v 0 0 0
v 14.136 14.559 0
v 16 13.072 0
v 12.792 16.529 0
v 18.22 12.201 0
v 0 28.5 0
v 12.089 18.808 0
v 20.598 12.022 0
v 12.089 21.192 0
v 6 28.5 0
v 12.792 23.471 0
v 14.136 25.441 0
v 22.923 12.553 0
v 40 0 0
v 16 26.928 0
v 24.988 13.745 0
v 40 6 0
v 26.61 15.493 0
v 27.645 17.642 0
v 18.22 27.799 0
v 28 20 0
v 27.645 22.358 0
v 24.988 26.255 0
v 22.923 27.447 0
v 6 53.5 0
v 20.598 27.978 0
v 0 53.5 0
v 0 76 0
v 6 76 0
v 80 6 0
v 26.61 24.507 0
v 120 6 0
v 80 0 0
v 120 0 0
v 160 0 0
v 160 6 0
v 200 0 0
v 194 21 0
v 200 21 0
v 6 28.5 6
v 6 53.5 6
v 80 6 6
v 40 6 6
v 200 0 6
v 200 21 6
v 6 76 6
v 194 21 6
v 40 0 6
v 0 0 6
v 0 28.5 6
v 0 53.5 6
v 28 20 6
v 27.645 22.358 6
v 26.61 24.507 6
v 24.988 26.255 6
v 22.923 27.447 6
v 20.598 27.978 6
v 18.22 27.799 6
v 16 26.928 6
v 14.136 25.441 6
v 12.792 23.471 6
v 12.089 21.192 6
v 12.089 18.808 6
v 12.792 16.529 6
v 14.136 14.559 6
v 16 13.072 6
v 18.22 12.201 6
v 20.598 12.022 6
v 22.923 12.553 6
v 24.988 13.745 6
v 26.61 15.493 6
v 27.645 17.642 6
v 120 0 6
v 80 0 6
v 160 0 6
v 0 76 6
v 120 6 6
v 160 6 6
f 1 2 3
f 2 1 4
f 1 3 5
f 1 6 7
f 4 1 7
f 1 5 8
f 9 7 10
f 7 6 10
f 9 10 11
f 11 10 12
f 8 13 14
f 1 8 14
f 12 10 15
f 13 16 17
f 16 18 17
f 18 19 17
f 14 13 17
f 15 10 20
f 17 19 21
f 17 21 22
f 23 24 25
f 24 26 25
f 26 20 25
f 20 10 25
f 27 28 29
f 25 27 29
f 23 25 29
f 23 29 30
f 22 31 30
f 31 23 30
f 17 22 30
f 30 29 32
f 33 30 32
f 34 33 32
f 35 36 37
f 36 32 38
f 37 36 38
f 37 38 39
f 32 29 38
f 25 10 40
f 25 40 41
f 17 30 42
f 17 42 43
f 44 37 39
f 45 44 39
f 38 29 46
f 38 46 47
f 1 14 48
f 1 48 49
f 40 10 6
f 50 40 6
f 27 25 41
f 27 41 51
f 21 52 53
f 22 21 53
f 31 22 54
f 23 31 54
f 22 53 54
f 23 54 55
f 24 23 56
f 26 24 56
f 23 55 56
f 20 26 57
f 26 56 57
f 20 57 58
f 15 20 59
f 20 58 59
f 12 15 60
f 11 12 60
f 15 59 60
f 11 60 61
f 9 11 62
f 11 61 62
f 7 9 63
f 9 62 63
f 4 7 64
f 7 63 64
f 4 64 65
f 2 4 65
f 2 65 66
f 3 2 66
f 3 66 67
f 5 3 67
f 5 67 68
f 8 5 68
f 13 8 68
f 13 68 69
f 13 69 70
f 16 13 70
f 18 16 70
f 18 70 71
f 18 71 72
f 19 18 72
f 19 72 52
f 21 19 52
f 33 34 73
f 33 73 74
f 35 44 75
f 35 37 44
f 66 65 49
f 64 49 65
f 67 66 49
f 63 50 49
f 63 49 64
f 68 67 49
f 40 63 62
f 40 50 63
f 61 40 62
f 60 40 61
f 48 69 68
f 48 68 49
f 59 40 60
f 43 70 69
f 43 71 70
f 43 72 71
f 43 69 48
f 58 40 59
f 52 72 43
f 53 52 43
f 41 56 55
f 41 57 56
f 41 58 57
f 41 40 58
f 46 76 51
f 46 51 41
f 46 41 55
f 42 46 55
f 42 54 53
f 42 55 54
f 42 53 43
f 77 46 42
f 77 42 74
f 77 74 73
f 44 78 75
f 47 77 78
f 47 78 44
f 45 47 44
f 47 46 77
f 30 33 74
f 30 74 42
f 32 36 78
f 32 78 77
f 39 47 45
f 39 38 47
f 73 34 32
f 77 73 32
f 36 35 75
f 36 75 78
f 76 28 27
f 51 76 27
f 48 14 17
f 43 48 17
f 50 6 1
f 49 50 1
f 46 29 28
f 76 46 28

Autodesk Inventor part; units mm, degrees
ref_plane "YZ Plane" through (0, 0, 0) normal (1, 0, 0) x (0, 1, 0)
ref_plane "XZ Plane" through (0, 0, 0) normal (0, 1, 0) x (-1, 0, 0)
ref_plane "XY Plane" through (0, 0, 0) normal (0, 0, 1) x (1, 0, 0)
ref_plane "Work Plane1" through (0, 0, 0) normal (0, 0, 1) x (1, 0, 0)
sketch "Sketch1" plane through (0, 0, 0) normal (0, 0, 1) x (1, 0, 0)
  line L0 (0, 6) -> (40, 6)
  line L1 (0, 0) -> (0, 6)
  line L2 (40, 0) -> (0, 0)
  line L3 (40, 0) -> (40, 6)
  line L4 (80, 0) -> (80, 6)
  line L5 (80, 6) -> (40, 6)
  line L6 (40, 6) -> (40, 0)
  line L7 (40, 0) -> (80, 0)
  line L8 (80, 6) -> (120, 6)
  line L9 (80, 0) -> (80, 6)
  line L10 (120, 0) -> (80, 0)
  line L11 (120, 0) -> (120, 6)
  line L12 (160, 0) -> (160, 6)
  line L13 (160, 6) -> (120, 6)
  line L14 (120, 6) -> (120, 0)
  line L15 (120, 0) -> (160, 0)
  line L16 (160, 6) -> (200, 6)
  line L17 (160, 0) -> (160, 6)
  line L18 (200, 0) -> (160, 0)
  line L19 (200, 6) -> (200, 0)
  line L20 (200, 6) -> (200, 21)
  line L21 (194, 21) -> (200, 21)
  line L22 (194, 21) -> (194, 6)
  line L23 (194, 6) -> (200, 6)
  line L24 (6, 28.5) -> (0, 28.5)
  line L25 (0, 28.5) -> (0, 6)
  line L26 (6, 6) -> (0, 6)
  line L27 (6, 6) -> (6, 28.5)
  line L28 (0, 53.5) -> (0, 28.5)
  line L29 (6, 28.5) -> (0, 28.5)
  line L30 (6, 28.5) -> (6, 53.5)
  line L31 (6, 53.5) -> (0, 53.5)
  line L32 (6, 53.5) -> (0, 53.5)
  line L33 (6, 53.5) -> (6, 76)
  line L34 (6, 76) -> (0, 76)
  line L35 (0, 76) -> (0, 53.5)
  line L36 (6, 76) -> (194, 21)
extrude "Plate1" add sketch "Sketch1" along normal blind 6 contours L25 L24 L27 L0 | L0 L3 L2 L1 | L27 L30 L33 L36 L22 L16 L13 L8 L5 L0 | L35 L34 L33 L31 | L8 L11 L10 L4 | L16 L19 L18 L12 | L21 L20 L16 L22
sketch "Sketch2" plane through (0, 0, 6) normal (0, 0, 1) x (1, 0, 0)
  line L0 (0, 0) -> (0, 28.5) projected
  line L1 (40, 0) -> (0, 0) projected
  line L2 (40, 6) -> (40, 0) projected
  line L3 (80, 6) -> (40, 6) projected
  line L4 (80, 0) -> (80, 6) projected
  line L5 (120, 0) -> (80, 0) projected
  line L6 (120, 6) -> (120, 0) projected
  line L7 (160, 6) -> (120, 6) projected
  line L8 (160, 0) -> (160, 6) projected
  line L9 (200, 0) -> (160, 0) projected
  line L10 (200, 21) -> (200, 0) projected
  line L11 (194, 21) -> (200, 21) projected
  line L12 (6, 76) -> (194, 21) projected
  line L13 (0, 76) -> (6, 76) projected
  line L14 (0, 53.5) -> (0, 76) projected
  line L15 (6, 53.5) -> (0, 53.5) projected
  line L16 (6, 28.5) -> (6, 53.5) projected
  line L17 (0, 28.5) -> (6, 28.5) projected
  circle A0 centre (20, 20) radius 8
  point P0 (0, 0)
  point P1 (20, 0)
  dimension "d1" = 16
  dimension "d2" = 20
extrude "Cut1" cut sketch "Sketch2" against normal blind 6 contours A0
equation "\"d3\" = Thickness"
equation "\"d0\" = Thickness"
equation "\"BendRadius\" = Thickness"
equation "\"BendReliefWidth\" = Thickness"
equation "\"BendReliefDepth\" = 0.5 * Thickness"
equation "\"CornerReliefSize\" = 4 * Thickness"
equation "\"MinimumRemnant\" = 2 * Thickness"
equation "\"TransitionRadius\" = BendRadius"
equation "\"JacobiRadiusSize\" = BendRadius"
equation "\"GapSize\" = Thickness"
equation "\"Thickness\" = 6"
properties part number "zijkant elektrobox voor knop" material "Wood (Birch)"
